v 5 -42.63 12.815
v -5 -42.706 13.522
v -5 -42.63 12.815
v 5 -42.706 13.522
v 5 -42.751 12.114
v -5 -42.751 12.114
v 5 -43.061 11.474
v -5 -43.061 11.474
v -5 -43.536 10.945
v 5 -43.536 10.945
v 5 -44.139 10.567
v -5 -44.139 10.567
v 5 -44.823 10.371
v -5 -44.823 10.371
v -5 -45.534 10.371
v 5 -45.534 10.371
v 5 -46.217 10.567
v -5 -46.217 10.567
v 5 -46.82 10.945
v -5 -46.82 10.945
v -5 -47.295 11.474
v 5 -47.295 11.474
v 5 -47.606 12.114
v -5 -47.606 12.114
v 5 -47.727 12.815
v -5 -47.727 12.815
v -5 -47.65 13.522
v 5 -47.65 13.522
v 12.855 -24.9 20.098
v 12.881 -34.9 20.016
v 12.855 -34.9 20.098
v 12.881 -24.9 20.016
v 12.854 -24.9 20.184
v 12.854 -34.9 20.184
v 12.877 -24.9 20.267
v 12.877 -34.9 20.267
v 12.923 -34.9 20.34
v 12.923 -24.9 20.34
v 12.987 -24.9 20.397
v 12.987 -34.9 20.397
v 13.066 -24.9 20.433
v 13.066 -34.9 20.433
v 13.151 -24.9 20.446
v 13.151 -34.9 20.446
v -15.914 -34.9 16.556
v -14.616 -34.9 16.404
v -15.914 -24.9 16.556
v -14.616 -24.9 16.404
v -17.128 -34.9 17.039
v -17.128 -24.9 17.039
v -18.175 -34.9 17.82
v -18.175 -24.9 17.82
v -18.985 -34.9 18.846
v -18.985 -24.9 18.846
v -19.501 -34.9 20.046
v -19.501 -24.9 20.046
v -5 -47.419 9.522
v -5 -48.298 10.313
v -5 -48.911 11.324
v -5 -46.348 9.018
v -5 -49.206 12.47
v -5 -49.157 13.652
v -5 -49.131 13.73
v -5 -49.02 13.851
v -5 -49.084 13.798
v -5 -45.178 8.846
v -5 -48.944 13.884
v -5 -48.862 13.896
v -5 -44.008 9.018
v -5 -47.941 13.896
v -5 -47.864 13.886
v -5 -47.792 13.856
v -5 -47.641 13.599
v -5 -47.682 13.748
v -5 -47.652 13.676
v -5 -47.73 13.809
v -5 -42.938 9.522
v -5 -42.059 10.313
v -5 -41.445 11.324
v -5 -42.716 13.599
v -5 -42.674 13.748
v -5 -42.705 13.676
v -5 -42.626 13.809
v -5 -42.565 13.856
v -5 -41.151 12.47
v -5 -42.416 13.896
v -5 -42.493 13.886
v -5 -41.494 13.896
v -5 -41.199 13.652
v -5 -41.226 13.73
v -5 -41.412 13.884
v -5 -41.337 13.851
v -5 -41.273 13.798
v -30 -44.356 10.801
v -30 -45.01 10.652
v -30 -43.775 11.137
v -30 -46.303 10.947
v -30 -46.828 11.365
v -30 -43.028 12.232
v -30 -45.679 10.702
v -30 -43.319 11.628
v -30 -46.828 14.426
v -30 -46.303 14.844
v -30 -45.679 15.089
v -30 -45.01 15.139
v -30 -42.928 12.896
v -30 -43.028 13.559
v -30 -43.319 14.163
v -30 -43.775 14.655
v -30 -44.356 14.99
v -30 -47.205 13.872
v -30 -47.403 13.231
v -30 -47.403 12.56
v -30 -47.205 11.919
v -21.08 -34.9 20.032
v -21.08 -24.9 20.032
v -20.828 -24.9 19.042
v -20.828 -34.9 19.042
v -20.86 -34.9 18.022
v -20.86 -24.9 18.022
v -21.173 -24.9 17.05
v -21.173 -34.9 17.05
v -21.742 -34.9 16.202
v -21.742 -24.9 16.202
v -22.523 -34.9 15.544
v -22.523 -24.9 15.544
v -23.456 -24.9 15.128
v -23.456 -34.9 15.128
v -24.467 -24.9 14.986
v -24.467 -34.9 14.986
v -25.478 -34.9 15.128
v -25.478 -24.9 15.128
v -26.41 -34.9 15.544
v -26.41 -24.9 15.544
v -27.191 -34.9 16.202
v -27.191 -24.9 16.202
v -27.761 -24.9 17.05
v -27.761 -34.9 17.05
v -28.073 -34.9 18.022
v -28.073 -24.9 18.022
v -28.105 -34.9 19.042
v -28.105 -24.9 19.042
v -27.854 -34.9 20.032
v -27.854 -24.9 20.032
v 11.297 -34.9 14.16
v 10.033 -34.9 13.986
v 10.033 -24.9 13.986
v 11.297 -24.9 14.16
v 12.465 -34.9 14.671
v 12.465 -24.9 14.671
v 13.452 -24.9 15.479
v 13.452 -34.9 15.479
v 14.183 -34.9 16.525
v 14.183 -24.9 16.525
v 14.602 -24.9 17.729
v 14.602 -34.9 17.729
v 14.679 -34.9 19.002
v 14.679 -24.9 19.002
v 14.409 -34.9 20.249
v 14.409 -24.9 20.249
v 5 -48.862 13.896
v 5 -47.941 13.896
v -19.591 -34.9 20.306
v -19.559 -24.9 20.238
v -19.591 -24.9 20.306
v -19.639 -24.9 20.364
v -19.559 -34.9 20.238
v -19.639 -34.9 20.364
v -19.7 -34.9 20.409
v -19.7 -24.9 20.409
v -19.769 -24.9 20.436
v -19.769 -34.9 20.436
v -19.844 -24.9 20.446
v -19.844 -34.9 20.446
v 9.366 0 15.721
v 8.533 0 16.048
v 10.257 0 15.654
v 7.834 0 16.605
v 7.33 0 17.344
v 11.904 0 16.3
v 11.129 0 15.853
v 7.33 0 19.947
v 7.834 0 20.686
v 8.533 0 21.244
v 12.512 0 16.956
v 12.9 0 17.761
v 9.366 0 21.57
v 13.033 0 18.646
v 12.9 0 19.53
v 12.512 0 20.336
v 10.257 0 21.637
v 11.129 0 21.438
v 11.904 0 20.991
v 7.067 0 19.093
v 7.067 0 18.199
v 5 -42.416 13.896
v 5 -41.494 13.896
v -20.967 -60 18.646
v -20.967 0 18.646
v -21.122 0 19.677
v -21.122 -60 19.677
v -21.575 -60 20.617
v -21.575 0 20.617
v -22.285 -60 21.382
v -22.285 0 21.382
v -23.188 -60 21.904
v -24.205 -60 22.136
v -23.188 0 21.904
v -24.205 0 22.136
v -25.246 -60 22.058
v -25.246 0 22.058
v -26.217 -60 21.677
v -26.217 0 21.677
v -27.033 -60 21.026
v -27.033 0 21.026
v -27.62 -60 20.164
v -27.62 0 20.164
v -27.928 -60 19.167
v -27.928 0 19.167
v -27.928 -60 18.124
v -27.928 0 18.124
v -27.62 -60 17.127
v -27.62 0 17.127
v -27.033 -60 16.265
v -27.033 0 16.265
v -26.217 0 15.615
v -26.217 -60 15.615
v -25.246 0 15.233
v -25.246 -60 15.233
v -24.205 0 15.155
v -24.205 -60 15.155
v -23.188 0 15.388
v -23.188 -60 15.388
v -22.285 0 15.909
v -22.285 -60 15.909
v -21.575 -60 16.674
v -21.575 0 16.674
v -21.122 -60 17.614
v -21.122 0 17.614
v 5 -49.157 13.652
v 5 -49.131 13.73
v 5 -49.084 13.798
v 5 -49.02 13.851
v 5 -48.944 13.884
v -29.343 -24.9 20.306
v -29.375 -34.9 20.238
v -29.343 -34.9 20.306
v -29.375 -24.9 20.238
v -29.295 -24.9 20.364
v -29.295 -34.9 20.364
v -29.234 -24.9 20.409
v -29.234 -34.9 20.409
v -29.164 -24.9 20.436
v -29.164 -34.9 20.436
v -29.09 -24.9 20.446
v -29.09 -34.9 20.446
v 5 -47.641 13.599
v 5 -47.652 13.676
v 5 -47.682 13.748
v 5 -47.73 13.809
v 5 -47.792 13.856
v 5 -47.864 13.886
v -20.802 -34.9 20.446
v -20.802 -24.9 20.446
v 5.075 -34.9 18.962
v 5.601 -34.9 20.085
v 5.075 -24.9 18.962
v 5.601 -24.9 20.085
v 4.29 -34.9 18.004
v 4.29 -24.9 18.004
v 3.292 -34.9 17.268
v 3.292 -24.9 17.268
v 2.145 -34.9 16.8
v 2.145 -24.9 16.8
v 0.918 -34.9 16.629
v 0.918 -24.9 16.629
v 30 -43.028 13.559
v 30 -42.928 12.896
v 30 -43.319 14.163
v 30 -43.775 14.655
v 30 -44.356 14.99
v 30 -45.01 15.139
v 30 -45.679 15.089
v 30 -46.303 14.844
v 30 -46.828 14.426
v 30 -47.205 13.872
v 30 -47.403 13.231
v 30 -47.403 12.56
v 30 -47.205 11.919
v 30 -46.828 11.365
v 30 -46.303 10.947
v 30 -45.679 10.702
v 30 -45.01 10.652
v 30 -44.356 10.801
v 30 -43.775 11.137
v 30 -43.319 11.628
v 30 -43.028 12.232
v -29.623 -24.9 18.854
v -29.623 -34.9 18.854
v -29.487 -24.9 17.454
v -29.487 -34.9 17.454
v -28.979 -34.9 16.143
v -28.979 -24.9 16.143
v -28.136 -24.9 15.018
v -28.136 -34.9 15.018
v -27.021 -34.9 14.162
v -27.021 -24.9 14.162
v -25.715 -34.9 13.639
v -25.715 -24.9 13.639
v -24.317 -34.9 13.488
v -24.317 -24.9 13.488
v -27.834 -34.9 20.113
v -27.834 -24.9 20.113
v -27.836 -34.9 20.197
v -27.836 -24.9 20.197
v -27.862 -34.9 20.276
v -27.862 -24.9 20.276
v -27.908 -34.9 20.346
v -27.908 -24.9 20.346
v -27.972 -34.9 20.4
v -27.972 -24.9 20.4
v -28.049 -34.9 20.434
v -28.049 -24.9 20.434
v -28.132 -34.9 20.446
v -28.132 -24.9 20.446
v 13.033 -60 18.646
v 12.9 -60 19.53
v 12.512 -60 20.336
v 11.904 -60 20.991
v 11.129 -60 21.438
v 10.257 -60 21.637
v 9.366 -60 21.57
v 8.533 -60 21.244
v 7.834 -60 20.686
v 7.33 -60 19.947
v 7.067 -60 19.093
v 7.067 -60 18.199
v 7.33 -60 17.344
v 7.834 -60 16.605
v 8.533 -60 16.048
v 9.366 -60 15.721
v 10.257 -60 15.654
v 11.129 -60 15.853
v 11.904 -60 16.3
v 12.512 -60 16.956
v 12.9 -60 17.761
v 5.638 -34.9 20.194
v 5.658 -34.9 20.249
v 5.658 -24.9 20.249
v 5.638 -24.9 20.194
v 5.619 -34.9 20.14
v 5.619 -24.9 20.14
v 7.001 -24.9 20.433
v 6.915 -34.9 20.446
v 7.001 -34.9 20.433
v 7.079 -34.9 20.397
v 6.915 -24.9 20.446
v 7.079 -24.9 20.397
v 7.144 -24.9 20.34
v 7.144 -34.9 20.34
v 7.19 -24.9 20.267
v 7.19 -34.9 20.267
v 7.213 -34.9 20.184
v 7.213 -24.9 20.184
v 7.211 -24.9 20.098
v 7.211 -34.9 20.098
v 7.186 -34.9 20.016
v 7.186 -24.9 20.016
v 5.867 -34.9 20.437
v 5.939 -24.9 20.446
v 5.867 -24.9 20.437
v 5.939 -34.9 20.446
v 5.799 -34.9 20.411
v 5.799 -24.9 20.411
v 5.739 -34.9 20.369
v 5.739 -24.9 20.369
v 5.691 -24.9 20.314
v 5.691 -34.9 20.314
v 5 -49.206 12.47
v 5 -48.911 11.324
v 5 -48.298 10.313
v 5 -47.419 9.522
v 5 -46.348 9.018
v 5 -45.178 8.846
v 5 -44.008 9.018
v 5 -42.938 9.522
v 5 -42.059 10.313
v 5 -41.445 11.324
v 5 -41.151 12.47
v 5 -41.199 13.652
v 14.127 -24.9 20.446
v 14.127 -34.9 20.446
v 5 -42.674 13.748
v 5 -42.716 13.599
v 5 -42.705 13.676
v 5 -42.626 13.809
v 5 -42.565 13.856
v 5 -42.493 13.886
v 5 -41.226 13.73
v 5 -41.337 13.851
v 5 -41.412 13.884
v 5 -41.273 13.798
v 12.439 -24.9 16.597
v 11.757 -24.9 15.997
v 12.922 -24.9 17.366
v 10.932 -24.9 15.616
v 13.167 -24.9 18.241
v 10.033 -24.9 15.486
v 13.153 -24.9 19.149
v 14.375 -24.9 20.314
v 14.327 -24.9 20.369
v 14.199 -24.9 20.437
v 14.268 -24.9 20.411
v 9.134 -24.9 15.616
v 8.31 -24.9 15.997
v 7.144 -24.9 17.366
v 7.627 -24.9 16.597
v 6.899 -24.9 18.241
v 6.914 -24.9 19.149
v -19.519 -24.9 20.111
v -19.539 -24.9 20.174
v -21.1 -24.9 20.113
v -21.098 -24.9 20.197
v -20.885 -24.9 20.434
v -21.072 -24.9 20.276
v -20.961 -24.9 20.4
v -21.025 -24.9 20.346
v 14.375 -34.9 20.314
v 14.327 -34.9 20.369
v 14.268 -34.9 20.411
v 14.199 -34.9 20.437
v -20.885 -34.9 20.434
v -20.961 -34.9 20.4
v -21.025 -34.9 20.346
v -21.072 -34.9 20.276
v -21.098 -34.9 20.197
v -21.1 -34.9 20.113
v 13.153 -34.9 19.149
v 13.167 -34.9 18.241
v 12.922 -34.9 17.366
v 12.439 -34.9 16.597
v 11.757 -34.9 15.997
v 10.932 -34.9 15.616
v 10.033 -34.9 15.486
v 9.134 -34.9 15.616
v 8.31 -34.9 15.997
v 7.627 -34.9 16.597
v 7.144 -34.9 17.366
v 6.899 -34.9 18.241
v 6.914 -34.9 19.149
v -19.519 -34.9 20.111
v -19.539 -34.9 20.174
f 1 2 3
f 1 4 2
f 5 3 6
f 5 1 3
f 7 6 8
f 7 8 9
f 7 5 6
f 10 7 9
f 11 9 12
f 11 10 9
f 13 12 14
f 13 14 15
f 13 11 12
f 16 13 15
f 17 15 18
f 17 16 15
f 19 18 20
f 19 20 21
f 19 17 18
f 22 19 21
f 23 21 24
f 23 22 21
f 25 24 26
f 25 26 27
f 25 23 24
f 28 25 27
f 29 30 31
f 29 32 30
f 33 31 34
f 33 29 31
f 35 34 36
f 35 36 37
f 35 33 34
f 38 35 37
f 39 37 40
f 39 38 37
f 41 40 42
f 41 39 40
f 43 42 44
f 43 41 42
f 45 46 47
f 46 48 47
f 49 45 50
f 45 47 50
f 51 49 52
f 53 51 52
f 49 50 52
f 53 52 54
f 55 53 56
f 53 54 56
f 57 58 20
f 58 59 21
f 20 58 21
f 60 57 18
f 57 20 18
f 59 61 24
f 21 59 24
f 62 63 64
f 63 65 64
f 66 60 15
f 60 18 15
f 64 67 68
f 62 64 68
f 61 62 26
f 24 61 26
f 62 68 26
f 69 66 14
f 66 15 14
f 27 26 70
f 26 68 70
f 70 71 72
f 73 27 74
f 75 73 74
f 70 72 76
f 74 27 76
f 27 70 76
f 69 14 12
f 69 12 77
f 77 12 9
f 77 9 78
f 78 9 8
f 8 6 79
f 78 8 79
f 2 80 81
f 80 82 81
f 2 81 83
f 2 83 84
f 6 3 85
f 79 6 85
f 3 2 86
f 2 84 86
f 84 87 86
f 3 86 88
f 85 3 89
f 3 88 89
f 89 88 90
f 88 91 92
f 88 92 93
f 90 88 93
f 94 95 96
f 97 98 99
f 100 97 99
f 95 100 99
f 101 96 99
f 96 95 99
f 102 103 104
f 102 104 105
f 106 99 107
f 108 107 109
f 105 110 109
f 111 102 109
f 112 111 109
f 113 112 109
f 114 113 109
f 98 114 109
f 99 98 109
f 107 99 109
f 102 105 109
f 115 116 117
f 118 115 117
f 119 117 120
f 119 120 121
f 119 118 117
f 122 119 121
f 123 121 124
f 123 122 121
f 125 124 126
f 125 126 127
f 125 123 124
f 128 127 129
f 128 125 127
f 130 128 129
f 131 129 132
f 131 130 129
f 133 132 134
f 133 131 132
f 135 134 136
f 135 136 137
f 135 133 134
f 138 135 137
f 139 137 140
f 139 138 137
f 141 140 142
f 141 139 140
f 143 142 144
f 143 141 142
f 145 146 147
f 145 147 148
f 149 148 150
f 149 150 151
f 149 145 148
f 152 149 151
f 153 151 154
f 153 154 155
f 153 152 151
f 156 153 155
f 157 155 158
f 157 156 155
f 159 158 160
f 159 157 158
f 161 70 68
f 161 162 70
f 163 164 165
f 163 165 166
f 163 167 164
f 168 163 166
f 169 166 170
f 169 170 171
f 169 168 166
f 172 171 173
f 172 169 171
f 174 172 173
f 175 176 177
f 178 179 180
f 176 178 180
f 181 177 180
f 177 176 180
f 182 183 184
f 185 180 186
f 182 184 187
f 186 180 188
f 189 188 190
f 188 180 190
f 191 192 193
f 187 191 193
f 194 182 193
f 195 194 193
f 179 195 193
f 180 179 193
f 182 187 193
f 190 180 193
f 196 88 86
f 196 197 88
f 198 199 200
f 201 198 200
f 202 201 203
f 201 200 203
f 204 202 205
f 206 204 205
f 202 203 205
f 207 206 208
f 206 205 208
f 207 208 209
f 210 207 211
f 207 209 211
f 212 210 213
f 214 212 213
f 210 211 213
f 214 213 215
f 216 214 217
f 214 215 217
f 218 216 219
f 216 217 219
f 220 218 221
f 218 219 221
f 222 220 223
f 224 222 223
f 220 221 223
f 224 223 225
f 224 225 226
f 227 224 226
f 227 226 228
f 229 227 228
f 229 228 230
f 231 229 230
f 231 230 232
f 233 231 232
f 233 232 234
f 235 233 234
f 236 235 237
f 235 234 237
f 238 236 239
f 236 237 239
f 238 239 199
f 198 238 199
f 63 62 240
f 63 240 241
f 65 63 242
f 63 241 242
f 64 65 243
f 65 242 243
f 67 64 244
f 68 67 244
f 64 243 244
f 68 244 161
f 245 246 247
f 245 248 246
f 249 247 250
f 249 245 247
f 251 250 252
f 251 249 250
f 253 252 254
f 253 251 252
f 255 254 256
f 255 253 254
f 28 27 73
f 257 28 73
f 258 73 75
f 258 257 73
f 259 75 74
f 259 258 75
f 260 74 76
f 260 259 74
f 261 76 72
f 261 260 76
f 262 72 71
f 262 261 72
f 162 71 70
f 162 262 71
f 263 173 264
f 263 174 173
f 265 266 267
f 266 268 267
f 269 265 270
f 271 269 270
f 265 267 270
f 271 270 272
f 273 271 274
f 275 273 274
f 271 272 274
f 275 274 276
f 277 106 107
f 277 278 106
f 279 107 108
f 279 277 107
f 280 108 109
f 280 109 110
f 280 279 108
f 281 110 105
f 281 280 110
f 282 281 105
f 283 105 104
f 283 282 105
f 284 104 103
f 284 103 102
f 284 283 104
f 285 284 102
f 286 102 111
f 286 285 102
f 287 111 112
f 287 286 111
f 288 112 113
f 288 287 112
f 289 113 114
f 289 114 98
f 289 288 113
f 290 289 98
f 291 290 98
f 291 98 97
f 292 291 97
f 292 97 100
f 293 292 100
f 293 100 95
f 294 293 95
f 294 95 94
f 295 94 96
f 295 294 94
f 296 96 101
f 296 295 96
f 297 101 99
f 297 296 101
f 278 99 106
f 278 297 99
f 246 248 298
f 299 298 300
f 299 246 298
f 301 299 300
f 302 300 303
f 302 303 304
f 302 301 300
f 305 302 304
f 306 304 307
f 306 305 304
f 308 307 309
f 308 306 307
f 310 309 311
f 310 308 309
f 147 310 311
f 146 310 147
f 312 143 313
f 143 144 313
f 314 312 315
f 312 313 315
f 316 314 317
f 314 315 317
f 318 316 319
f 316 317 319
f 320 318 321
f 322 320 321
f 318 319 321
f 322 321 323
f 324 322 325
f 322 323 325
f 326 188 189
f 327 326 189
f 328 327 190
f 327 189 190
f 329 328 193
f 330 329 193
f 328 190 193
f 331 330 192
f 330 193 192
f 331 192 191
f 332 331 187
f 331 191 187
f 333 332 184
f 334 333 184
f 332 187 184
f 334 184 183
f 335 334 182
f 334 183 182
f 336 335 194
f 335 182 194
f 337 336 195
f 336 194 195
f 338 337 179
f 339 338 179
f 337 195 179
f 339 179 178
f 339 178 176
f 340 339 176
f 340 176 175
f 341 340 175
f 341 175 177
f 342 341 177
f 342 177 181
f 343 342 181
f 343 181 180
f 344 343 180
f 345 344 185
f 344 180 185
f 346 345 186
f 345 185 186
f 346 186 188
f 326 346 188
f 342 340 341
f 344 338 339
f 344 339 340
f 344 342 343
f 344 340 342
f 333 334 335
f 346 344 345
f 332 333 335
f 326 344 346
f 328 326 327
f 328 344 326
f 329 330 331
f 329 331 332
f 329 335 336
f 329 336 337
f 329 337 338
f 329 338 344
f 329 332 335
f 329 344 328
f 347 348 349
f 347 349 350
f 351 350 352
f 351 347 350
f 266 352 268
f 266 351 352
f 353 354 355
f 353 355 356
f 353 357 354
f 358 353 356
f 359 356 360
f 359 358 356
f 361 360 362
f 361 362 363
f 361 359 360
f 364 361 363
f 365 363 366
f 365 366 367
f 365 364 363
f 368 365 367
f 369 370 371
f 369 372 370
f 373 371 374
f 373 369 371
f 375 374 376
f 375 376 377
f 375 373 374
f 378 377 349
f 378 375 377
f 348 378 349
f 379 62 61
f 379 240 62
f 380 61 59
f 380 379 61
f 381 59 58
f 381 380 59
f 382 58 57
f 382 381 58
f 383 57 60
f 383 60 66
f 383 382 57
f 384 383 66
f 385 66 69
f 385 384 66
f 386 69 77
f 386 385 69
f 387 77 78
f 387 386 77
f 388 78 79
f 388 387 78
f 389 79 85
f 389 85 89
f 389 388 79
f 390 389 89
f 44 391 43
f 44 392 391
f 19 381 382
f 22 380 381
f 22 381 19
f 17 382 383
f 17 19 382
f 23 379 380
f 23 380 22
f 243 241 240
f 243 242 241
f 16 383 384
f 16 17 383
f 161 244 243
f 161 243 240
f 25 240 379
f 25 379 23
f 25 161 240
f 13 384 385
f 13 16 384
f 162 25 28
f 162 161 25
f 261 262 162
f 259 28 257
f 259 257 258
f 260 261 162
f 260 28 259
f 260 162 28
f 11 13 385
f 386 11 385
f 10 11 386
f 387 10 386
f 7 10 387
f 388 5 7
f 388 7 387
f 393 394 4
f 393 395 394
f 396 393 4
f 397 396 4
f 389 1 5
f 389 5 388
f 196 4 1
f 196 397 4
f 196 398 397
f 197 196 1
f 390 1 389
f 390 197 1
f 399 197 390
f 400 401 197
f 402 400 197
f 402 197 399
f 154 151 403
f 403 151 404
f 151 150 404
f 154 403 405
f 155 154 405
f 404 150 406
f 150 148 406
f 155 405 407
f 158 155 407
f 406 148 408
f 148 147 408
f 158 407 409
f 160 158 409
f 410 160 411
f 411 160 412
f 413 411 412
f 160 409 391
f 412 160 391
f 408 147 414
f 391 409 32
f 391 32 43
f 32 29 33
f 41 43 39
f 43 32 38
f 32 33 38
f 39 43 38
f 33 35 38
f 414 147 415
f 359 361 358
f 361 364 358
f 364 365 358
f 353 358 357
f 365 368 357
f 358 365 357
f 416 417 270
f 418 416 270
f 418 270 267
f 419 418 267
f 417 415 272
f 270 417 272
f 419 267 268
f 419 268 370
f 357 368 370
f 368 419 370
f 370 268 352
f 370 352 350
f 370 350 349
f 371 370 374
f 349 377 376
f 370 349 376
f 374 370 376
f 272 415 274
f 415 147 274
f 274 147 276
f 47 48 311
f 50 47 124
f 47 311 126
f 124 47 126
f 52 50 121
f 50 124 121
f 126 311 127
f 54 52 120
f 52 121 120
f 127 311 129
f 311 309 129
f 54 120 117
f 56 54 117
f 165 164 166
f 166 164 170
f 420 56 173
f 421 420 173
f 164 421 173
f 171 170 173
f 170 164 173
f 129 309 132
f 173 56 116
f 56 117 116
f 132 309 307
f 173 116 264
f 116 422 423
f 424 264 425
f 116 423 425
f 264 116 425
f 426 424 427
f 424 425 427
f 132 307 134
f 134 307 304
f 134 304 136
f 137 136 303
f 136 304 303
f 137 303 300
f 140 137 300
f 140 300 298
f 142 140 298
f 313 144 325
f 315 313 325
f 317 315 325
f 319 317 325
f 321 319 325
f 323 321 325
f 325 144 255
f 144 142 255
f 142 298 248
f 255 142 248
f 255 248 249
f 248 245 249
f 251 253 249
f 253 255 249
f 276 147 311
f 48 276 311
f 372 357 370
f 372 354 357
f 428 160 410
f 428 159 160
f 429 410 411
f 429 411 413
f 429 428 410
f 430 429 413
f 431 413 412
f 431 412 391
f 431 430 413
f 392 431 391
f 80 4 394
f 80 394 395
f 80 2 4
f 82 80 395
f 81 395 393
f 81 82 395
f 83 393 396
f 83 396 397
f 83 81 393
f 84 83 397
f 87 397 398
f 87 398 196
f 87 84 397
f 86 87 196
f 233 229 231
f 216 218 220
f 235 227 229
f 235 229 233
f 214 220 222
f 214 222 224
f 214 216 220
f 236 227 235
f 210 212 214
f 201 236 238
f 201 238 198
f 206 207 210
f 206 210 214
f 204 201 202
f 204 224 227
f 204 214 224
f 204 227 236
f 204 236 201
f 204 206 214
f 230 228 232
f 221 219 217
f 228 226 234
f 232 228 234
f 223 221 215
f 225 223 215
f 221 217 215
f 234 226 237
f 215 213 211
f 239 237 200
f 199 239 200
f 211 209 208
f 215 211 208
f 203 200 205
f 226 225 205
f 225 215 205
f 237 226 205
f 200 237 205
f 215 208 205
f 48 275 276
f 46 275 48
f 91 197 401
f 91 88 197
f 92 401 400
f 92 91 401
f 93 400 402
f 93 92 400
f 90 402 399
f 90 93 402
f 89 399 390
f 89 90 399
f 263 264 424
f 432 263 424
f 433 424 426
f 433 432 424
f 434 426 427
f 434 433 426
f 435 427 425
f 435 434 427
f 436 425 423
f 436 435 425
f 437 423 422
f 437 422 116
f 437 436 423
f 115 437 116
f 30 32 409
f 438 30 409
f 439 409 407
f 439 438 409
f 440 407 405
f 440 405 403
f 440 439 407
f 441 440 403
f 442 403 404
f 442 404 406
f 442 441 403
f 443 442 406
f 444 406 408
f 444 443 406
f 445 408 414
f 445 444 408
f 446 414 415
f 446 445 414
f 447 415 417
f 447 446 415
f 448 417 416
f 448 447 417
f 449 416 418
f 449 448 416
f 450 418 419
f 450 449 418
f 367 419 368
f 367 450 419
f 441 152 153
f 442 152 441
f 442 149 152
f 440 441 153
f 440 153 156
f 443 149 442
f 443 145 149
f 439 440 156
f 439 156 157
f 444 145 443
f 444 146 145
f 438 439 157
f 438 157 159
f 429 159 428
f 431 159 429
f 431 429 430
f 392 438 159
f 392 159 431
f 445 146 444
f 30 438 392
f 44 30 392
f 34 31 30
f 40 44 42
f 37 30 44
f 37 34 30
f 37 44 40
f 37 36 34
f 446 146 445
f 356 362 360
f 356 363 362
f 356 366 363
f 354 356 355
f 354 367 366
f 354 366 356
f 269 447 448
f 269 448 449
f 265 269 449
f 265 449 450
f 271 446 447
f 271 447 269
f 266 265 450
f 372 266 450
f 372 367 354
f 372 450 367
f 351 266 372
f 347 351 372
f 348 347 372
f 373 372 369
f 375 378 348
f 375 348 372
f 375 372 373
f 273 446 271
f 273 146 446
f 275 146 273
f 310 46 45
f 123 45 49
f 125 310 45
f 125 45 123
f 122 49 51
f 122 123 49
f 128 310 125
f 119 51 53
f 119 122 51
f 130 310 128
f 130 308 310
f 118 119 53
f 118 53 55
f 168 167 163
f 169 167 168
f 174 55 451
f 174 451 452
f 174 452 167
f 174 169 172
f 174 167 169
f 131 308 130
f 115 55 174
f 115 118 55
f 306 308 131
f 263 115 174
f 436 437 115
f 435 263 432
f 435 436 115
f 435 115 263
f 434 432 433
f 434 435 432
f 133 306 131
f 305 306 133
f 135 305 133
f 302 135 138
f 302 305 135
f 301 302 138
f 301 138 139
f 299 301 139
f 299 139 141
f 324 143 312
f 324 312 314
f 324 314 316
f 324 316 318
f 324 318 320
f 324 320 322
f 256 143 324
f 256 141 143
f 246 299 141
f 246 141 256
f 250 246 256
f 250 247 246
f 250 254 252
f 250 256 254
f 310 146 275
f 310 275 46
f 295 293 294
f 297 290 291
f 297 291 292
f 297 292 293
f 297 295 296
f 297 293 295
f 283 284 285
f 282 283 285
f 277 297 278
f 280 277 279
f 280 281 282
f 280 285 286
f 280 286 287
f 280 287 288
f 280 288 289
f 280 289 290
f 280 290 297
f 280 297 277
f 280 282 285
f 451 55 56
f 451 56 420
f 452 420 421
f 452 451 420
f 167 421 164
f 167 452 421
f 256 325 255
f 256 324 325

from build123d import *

# Parameters (mm, degrees)
F0_R      = 3.5
F1_DEPTH  = 60
F0_R_2    = 3
F2_R      = 2.25
F3_DEPTH  = 30
F5_DEPTH  = 5
F6_R      = 0.3
F9_DEPTH  = 5
F10_ANGLE = 90
F11_ANGLE = 270
F13_DEPTH = 10
F14_R     = 0.3
F15_R     = 5


with BuildPart() as f1:
    # F0 (on Front) → F1 (new body)
    with BuildSketch(Plane.XZ):
        with Locations((-24.4668319107, 18.6456460506)):
            Circle(F0_R)
    extrude(amount=F1_DEPTH)


with BuildPart() as f1b:
    # F0 (on Front) → F1, piece 2 (new body)
    with BuildSketch(Plane.XZ):
        with Locations((10.0331680893, 18.6456460506)):
            Circle(F0_R_2)
    extrude(amount=F1_DEPTH)


with BuildPart() as f3:
    # F2 (on Right) → F3 (new body, symmetric)
    with BuildSketch(Plane.YZ):
        with Locations((-45.1782383025, 12.8956460506)):
            Circle(F2_R)
    extrude(amount=F3_DEPTH, both=True)


with BuildPart() as f5:
    # F4 (on Right) → F5 (new body, symmetric)
    with BuildSketch(Plane.YZ):
        with BuildLine():
            ThreePointArc((-42.8324974813, 13.8956460506), (-45.1782383025, 10.3456460506), (-47.5239791236, 13.8956460506))
            Line((-47.5239791236, 13.8956460506), (-49.1028401931, 13.8956460506))
            ThreePointArc((-49.1028401931, 13.8956460506), (-45.1782383025, 8.8456460506), (-41.2536364118, 13.8956460506))
            Line((-41.2536364118, 13.8956460506), (-42.8324974813, 13.8956460506))
        make_face()
    extrude(amount=F5_DEPTH, both=True)

    # F6
    f6_edges = [f5.edges().sort_by_distance(p)[0] for p in [
        (0, -41.253636, 13.895646),
        (0, -42.832497, 13.895646),
        (0, -47.523979, 13.895646),
        (0, -49.10284, 13.895646),
    ]]
    fillet(f6_edges, radius=F6_R)


with BuildPart() as f9:
    # F8 (on offset) → F9 (new body, symmetric)
    with BuildSketch(Plane.XZ.offset(29.9)):
        with BuildLine():
            ThreePointArc((-26.2668319107, 13.8097800475), (-19.3068319107, 18.6456460506), (-26.2668319107, 23.4815120537))
            Line((-26.2668319107, 23.4815120537), (-26.2668319107, 21.8324312645))
            ThreePointArc((-26.2668319107, 21.8324312645), (-20.8068319107, 18.6456460506), (-26.2668319107, 15.4588608366))
            Line((-26.2668319107, 15.4588608366), (-26.2668319107, 13.8097800475))
        make_face()
    extrude(amount=F9_DEPTH, both=True)


with BuildPart() as f9b:
    # F8 (on offset) → F9, piece 2 (new body, symmetric)
    with BuildSketch(Plane.XZ.offset(29.9)):
        with BuildLine():
            Line((11.8331680893, 21.2428753435), (11.8331680893, 22.9439713058))
            ThreePointArc((11.8331680893, 22.9439713058), (5.3731680893, 18.6456460506), (11.8331680893, 14.3473207953))
            Line((11.8331680893, 14.3473207953), (11.8331680893, 16.0484167577))
            ThreePointArc((11.8331680893, 16.0484167577), (6.8731680893, 18.6456460506), (11.8331680893, 21.2428753435))
        make_face()
    extrude(amount=F9_DEPTH, both=True)


with BuildPart() as f9_1:
    # F10: moved
    add(f9.part.rotate(Axis((-24.4668319107, 0, 18.6456460506), (0, 1, 0)), F10_ANGLE))



with BuildPart() as f9b_1:
    # F11: moved
    add(f9b.part.rotate(Axis((10.0331680893, 0, 18.6456460506), (0, 1, 0)), F11_ANGLE))


with BuildPart() as f9_2:
    add(f9_1.part)

    add(f9b_1.part)  # F13 merges F9b
    # F12 (on face) → F13 (join)
    with BuildSketch(Plane.XZ.offset(34.9)):
        with BuildLine():
            ThreePointArc((10.0331680893, 13.9856460506), (7.5183986062, 14.7224414362), (5.7988525354, 16.6998372752))
            Line((5.7988525354, 16.6998372752), (-19.8566035887, 16.3280190705))
            ThreePointArc((-19.8566035887, 16.3280190705), (-21.695455678, 14.293052137), (-24.3172981014, 13.4878132072))
            Line((-24.3172981014, 13.4878132072), (10.0331680893, 13.9856460506))
        make_face()
    extrude(amount=-F13_DEPTH)

    # F14
    f14_edges = [f9_2.edges().sort_by_distance(p)[0] for p in [
        (-19.630966, -29.9, 20.445646),
        (-21.280047, -29.9, 20.445646),
        (-27.653617, -29.9, 20.445646),
        (-29.302698, -29.9, 20.445646),
        (7.435939, -29.9, 20.445646),
        (5.734843, -29.9, 20.445646),
        (14.331493, -29.9, 20.445646),
        (12.630397, -29.9, 20.445646),
    ]]
    fillet(f14_edges, radius=F14_R)

    # F15
    f15_edges = [f9_2.edges().sort_by_distance(p)[0] for p in [
        (-19.856604, -29.9, 16.328019),
        (5.798853, -29.9, 16.699837),
    ]]
    fillet(f15_edges, radius=F15_R)


solid = Compound([f1.part, f1b.part, f3.part, f5.part, f9_2.part])
